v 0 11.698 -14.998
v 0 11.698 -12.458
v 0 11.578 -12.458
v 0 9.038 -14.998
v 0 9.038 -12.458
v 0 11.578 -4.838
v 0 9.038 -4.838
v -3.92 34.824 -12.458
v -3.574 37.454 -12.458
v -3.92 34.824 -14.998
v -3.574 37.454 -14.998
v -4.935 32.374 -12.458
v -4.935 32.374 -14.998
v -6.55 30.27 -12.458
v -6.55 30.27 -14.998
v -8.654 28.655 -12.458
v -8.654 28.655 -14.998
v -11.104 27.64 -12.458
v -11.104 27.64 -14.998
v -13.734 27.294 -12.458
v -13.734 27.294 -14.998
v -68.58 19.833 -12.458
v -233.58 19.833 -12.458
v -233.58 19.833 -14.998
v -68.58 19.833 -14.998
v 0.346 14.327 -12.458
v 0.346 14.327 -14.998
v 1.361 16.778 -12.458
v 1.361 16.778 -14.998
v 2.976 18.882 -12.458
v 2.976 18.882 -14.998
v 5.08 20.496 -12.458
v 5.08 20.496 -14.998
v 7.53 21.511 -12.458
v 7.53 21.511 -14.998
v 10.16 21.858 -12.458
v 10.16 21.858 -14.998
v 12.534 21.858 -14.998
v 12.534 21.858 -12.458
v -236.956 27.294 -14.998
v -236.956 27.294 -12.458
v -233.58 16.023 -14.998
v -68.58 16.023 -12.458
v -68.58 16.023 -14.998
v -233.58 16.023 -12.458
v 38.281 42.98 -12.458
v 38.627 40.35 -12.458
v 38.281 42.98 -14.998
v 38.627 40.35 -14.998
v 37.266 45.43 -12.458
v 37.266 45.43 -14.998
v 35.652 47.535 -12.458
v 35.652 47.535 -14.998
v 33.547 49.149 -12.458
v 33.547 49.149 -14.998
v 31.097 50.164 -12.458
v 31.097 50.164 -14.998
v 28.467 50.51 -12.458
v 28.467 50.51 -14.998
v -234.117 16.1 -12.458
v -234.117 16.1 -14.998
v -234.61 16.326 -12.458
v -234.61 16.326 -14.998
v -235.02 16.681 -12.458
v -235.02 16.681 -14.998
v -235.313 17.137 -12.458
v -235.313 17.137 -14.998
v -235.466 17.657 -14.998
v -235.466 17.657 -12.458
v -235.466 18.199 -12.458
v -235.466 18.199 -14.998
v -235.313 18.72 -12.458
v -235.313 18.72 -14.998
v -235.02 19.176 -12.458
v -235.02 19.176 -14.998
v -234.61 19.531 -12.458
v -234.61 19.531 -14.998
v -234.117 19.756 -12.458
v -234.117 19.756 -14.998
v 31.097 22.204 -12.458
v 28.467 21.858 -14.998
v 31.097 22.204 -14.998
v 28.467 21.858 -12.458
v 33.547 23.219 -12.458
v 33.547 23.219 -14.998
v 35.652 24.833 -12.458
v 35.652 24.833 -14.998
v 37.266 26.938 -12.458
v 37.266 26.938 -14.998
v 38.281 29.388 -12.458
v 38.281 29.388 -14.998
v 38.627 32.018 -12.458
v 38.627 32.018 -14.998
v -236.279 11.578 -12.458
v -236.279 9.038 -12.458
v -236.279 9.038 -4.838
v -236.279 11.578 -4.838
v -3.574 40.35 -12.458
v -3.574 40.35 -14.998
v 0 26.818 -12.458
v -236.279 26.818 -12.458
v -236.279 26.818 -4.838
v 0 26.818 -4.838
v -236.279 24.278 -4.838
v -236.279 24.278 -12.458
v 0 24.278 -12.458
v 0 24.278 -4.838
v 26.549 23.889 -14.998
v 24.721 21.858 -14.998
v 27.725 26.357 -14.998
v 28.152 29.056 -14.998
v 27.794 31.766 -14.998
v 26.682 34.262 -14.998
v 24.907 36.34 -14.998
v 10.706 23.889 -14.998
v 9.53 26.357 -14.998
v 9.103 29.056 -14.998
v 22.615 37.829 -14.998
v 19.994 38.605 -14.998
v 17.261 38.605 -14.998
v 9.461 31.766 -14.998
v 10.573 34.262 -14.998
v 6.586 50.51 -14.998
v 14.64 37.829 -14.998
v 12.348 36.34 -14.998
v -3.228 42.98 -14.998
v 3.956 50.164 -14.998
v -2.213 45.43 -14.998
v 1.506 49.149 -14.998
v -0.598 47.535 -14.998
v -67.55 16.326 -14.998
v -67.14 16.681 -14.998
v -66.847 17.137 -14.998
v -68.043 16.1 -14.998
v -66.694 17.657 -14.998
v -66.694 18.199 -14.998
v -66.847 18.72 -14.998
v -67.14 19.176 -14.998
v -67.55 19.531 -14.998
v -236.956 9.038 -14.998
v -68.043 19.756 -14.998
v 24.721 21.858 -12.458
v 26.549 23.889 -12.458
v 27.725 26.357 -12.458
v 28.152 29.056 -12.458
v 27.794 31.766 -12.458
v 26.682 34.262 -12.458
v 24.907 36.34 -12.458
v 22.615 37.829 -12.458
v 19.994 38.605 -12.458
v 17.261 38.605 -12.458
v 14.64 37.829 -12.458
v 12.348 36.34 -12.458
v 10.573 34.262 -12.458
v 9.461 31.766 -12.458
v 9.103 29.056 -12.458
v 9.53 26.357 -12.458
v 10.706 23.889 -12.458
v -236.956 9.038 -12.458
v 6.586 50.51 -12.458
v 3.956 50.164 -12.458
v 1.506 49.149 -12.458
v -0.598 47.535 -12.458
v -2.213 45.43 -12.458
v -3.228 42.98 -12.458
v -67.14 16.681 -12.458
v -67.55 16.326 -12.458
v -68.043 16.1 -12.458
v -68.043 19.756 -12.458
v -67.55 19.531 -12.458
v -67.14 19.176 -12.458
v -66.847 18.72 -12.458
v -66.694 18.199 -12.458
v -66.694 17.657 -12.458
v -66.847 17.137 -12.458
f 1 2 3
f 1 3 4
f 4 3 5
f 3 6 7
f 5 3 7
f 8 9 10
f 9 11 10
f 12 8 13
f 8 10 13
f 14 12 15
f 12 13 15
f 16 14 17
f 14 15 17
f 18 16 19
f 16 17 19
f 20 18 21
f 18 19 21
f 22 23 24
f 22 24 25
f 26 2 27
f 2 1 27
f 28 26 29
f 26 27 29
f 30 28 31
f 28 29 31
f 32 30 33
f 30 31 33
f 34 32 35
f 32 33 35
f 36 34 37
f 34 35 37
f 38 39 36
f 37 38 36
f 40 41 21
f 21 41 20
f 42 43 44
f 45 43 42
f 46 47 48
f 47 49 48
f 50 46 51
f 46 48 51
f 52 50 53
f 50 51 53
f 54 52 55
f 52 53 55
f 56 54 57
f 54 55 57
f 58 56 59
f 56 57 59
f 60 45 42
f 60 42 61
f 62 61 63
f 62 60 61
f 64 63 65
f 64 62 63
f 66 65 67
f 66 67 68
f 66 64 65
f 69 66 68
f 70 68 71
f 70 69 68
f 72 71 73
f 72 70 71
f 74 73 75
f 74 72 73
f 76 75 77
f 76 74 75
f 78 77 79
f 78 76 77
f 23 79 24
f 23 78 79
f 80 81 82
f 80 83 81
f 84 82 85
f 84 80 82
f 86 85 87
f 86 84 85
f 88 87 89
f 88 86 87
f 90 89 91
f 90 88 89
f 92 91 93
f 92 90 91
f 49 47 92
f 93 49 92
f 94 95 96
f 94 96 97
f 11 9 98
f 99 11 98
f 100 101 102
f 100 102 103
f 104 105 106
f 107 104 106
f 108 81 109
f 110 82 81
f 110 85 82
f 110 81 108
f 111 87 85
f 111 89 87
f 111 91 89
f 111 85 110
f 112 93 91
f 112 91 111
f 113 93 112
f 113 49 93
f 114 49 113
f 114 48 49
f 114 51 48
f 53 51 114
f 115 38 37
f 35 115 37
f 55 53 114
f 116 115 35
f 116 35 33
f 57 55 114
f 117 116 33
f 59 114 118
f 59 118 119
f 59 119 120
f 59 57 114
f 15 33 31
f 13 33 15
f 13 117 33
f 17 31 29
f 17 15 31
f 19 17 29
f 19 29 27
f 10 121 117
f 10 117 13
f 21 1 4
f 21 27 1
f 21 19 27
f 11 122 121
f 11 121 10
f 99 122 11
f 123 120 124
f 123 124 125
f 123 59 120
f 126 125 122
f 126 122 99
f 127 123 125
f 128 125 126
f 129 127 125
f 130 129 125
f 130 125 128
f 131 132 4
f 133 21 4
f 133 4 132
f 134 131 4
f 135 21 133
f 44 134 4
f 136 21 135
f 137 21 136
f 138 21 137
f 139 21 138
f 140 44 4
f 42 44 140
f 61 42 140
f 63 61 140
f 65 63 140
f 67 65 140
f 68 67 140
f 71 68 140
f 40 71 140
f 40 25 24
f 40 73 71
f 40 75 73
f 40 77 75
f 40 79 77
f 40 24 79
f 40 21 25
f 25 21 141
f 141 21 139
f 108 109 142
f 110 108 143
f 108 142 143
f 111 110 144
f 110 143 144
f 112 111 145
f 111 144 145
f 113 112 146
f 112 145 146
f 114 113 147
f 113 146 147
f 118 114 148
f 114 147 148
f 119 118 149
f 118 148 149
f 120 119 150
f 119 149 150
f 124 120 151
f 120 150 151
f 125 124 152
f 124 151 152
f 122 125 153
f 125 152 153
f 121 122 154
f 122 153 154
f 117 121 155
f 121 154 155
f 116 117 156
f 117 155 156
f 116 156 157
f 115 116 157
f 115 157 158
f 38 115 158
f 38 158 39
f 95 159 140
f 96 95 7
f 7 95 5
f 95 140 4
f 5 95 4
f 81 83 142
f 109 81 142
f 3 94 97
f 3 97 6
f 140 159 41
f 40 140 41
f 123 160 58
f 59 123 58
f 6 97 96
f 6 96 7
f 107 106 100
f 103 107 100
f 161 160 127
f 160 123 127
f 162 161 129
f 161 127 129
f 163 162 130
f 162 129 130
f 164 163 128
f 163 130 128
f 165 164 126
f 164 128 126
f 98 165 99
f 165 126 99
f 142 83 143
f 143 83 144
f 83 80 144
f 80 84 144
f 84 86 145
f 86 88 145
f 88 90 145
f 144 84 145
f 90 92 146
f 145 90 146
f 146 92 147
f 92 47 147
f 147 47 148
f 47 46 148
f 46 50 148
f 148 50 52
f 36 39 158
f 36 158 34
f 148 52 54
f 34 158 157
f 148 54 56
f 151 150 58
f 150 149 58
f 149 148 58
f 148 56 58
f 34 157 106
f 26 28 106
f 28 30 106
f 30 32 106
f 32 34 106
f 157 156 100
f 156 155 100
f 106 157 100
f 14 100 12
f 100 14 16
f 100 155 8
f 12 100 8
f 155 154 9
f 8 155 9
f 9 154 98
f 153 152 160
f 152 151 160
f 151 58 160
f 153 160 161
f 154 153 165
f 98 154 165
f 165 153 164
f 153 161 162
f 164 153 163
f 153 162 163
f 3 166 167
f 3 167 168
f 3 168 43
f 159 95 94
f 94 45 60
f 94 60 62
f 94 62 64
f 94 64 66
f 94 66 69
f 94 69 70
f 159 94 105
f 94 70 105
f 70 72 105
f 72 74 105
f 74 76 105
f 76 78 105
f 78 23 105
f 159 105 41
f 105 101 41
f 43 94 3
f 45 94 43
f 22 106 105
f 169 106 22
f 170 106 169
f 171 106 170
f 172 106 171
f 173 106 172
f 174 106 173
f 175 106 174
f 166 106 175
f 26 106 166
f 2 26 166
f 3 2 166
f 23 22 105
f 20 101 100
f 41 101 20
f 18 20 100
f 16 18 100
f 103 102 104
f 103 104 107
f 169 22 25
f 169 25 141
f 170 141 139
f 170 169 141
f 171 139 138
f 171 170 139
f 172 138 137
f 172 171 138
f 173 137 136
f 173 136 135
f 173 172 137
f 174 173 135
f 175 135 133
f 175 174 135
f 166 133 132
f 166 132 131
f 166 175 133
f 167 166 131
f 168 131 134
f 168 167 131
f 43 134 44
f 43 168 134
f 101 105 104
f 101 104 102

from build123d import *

# Parameters (mm, degrees)
BOSS_EXTRUDE1_DEPTH = 2.54
SKETCH2_R           = 9.525
CUT_EXTRUDE1_DEPTH  = 19.05
SKETCH3_W           = 236.278650797
SKETCH3_H           = 2.54
BOSS_EXTRUDE2_DEPTH = 7.62
CUT_EXTRUDE2_DEPTH  = 3.54
FILLET1_R           = 10.16


with BuildPart() as part:
    # Sketch1 → Boss-Extrude1 (new body)
    with BuildSketch(Plane.XY.offset(-12.457776114)):
        Polygon((-279.4, 85.357628122), (127, 85.357628122), (127, 21.857628122), (0, 21.857628122), (0, -12.141055663), (-279.4, -12.141055663), align=None)
        with BuildLine():
            Line((-233.58, 19.833203878), (-68.58, 19.833203878))
            ThreePointArc((-68.58, 19.833203878), (-66.675, 17.928203878), (-68.58, 16.023203878))
            Line((-68.58, 16.023203878), (-233.58, 16.023203878))
            ThreePointArc((-233.58, 16.023203878), (-235.485, 17.928203878), (-233.58, 19.833203878))
        make_face(mode=Mode.SUBTRACT)
    extrude(amount=-BOSS_EXTRUDE1_DEPTH)

    # Sketch2 → Cut-Extrude1 (cut)
    with BuildSketch(Plane.XY.offset(-12.457776114)):
        with Locations((18.627536258, 29.178203878)):
            Circle(SKETCH2_R)
    extrude(amount=-CUT_EXTRUDE1_DEPTH, mode=Mode.SUBTRACT)

    # Sketch3 → Boss-Extrude2 (add)
    with BuildSketch(Plane.XY.offset(-12.457776114)):
        with Locations((-118.139325399, 25.548203878)):
            Rectangle(SKETCH3_W, SKETCH3_H)
        with Locations((-118.139325399, 10.308203878)):
            Rectangle(SKETCH3_W, SKETCH3_H)
    extrude(amount=BOSS_EXTRUDE2_DEPTH)

    # Sketch4 → Cut-Extrude2 (cut, through all)
    with BuildSketch(Plane.XY.offset(-12.457776114)):
        Polygon((-279.4, -12.141055663), (0, -12.141055663), (0, 9.038203878), (-236.955667324, 9.038203878), (-236.955667324, 27.294063936), (-3.574037437, 27.294063936), (-3.574037437, 50.510436651), (38.627466089, 50.510436651), (38.627466089, 2.859516917), (133.335307594, 2.859516917), (133.335307594, 92.146273099), (38.627466089, 92.146273099), (38.627466089, 93.769303319), (-279.4, 93.769303319), align=None)
    extrude(amount=-CUT_EXTRUDE2_DEPTH, mode=Mode.SUBTRACT)

    # Fillet1
    fillet1_edges = [part.edges().sort_by_distance(p)[0] for p in [
        (0, 21.857628122, -13.727776114),
        (-3.574037437, 27.294063936, -13.727776114),
        (38.627466089, 21.857628122, -13.727776114),
        (-3.574037437, 50.510436651, -13.727776114),
        (38.627466089, 50.510436651, -13.727776114),
    ]]
    fillet(fillet1_edges, radius=FILLET1_R)


solid = part.part
